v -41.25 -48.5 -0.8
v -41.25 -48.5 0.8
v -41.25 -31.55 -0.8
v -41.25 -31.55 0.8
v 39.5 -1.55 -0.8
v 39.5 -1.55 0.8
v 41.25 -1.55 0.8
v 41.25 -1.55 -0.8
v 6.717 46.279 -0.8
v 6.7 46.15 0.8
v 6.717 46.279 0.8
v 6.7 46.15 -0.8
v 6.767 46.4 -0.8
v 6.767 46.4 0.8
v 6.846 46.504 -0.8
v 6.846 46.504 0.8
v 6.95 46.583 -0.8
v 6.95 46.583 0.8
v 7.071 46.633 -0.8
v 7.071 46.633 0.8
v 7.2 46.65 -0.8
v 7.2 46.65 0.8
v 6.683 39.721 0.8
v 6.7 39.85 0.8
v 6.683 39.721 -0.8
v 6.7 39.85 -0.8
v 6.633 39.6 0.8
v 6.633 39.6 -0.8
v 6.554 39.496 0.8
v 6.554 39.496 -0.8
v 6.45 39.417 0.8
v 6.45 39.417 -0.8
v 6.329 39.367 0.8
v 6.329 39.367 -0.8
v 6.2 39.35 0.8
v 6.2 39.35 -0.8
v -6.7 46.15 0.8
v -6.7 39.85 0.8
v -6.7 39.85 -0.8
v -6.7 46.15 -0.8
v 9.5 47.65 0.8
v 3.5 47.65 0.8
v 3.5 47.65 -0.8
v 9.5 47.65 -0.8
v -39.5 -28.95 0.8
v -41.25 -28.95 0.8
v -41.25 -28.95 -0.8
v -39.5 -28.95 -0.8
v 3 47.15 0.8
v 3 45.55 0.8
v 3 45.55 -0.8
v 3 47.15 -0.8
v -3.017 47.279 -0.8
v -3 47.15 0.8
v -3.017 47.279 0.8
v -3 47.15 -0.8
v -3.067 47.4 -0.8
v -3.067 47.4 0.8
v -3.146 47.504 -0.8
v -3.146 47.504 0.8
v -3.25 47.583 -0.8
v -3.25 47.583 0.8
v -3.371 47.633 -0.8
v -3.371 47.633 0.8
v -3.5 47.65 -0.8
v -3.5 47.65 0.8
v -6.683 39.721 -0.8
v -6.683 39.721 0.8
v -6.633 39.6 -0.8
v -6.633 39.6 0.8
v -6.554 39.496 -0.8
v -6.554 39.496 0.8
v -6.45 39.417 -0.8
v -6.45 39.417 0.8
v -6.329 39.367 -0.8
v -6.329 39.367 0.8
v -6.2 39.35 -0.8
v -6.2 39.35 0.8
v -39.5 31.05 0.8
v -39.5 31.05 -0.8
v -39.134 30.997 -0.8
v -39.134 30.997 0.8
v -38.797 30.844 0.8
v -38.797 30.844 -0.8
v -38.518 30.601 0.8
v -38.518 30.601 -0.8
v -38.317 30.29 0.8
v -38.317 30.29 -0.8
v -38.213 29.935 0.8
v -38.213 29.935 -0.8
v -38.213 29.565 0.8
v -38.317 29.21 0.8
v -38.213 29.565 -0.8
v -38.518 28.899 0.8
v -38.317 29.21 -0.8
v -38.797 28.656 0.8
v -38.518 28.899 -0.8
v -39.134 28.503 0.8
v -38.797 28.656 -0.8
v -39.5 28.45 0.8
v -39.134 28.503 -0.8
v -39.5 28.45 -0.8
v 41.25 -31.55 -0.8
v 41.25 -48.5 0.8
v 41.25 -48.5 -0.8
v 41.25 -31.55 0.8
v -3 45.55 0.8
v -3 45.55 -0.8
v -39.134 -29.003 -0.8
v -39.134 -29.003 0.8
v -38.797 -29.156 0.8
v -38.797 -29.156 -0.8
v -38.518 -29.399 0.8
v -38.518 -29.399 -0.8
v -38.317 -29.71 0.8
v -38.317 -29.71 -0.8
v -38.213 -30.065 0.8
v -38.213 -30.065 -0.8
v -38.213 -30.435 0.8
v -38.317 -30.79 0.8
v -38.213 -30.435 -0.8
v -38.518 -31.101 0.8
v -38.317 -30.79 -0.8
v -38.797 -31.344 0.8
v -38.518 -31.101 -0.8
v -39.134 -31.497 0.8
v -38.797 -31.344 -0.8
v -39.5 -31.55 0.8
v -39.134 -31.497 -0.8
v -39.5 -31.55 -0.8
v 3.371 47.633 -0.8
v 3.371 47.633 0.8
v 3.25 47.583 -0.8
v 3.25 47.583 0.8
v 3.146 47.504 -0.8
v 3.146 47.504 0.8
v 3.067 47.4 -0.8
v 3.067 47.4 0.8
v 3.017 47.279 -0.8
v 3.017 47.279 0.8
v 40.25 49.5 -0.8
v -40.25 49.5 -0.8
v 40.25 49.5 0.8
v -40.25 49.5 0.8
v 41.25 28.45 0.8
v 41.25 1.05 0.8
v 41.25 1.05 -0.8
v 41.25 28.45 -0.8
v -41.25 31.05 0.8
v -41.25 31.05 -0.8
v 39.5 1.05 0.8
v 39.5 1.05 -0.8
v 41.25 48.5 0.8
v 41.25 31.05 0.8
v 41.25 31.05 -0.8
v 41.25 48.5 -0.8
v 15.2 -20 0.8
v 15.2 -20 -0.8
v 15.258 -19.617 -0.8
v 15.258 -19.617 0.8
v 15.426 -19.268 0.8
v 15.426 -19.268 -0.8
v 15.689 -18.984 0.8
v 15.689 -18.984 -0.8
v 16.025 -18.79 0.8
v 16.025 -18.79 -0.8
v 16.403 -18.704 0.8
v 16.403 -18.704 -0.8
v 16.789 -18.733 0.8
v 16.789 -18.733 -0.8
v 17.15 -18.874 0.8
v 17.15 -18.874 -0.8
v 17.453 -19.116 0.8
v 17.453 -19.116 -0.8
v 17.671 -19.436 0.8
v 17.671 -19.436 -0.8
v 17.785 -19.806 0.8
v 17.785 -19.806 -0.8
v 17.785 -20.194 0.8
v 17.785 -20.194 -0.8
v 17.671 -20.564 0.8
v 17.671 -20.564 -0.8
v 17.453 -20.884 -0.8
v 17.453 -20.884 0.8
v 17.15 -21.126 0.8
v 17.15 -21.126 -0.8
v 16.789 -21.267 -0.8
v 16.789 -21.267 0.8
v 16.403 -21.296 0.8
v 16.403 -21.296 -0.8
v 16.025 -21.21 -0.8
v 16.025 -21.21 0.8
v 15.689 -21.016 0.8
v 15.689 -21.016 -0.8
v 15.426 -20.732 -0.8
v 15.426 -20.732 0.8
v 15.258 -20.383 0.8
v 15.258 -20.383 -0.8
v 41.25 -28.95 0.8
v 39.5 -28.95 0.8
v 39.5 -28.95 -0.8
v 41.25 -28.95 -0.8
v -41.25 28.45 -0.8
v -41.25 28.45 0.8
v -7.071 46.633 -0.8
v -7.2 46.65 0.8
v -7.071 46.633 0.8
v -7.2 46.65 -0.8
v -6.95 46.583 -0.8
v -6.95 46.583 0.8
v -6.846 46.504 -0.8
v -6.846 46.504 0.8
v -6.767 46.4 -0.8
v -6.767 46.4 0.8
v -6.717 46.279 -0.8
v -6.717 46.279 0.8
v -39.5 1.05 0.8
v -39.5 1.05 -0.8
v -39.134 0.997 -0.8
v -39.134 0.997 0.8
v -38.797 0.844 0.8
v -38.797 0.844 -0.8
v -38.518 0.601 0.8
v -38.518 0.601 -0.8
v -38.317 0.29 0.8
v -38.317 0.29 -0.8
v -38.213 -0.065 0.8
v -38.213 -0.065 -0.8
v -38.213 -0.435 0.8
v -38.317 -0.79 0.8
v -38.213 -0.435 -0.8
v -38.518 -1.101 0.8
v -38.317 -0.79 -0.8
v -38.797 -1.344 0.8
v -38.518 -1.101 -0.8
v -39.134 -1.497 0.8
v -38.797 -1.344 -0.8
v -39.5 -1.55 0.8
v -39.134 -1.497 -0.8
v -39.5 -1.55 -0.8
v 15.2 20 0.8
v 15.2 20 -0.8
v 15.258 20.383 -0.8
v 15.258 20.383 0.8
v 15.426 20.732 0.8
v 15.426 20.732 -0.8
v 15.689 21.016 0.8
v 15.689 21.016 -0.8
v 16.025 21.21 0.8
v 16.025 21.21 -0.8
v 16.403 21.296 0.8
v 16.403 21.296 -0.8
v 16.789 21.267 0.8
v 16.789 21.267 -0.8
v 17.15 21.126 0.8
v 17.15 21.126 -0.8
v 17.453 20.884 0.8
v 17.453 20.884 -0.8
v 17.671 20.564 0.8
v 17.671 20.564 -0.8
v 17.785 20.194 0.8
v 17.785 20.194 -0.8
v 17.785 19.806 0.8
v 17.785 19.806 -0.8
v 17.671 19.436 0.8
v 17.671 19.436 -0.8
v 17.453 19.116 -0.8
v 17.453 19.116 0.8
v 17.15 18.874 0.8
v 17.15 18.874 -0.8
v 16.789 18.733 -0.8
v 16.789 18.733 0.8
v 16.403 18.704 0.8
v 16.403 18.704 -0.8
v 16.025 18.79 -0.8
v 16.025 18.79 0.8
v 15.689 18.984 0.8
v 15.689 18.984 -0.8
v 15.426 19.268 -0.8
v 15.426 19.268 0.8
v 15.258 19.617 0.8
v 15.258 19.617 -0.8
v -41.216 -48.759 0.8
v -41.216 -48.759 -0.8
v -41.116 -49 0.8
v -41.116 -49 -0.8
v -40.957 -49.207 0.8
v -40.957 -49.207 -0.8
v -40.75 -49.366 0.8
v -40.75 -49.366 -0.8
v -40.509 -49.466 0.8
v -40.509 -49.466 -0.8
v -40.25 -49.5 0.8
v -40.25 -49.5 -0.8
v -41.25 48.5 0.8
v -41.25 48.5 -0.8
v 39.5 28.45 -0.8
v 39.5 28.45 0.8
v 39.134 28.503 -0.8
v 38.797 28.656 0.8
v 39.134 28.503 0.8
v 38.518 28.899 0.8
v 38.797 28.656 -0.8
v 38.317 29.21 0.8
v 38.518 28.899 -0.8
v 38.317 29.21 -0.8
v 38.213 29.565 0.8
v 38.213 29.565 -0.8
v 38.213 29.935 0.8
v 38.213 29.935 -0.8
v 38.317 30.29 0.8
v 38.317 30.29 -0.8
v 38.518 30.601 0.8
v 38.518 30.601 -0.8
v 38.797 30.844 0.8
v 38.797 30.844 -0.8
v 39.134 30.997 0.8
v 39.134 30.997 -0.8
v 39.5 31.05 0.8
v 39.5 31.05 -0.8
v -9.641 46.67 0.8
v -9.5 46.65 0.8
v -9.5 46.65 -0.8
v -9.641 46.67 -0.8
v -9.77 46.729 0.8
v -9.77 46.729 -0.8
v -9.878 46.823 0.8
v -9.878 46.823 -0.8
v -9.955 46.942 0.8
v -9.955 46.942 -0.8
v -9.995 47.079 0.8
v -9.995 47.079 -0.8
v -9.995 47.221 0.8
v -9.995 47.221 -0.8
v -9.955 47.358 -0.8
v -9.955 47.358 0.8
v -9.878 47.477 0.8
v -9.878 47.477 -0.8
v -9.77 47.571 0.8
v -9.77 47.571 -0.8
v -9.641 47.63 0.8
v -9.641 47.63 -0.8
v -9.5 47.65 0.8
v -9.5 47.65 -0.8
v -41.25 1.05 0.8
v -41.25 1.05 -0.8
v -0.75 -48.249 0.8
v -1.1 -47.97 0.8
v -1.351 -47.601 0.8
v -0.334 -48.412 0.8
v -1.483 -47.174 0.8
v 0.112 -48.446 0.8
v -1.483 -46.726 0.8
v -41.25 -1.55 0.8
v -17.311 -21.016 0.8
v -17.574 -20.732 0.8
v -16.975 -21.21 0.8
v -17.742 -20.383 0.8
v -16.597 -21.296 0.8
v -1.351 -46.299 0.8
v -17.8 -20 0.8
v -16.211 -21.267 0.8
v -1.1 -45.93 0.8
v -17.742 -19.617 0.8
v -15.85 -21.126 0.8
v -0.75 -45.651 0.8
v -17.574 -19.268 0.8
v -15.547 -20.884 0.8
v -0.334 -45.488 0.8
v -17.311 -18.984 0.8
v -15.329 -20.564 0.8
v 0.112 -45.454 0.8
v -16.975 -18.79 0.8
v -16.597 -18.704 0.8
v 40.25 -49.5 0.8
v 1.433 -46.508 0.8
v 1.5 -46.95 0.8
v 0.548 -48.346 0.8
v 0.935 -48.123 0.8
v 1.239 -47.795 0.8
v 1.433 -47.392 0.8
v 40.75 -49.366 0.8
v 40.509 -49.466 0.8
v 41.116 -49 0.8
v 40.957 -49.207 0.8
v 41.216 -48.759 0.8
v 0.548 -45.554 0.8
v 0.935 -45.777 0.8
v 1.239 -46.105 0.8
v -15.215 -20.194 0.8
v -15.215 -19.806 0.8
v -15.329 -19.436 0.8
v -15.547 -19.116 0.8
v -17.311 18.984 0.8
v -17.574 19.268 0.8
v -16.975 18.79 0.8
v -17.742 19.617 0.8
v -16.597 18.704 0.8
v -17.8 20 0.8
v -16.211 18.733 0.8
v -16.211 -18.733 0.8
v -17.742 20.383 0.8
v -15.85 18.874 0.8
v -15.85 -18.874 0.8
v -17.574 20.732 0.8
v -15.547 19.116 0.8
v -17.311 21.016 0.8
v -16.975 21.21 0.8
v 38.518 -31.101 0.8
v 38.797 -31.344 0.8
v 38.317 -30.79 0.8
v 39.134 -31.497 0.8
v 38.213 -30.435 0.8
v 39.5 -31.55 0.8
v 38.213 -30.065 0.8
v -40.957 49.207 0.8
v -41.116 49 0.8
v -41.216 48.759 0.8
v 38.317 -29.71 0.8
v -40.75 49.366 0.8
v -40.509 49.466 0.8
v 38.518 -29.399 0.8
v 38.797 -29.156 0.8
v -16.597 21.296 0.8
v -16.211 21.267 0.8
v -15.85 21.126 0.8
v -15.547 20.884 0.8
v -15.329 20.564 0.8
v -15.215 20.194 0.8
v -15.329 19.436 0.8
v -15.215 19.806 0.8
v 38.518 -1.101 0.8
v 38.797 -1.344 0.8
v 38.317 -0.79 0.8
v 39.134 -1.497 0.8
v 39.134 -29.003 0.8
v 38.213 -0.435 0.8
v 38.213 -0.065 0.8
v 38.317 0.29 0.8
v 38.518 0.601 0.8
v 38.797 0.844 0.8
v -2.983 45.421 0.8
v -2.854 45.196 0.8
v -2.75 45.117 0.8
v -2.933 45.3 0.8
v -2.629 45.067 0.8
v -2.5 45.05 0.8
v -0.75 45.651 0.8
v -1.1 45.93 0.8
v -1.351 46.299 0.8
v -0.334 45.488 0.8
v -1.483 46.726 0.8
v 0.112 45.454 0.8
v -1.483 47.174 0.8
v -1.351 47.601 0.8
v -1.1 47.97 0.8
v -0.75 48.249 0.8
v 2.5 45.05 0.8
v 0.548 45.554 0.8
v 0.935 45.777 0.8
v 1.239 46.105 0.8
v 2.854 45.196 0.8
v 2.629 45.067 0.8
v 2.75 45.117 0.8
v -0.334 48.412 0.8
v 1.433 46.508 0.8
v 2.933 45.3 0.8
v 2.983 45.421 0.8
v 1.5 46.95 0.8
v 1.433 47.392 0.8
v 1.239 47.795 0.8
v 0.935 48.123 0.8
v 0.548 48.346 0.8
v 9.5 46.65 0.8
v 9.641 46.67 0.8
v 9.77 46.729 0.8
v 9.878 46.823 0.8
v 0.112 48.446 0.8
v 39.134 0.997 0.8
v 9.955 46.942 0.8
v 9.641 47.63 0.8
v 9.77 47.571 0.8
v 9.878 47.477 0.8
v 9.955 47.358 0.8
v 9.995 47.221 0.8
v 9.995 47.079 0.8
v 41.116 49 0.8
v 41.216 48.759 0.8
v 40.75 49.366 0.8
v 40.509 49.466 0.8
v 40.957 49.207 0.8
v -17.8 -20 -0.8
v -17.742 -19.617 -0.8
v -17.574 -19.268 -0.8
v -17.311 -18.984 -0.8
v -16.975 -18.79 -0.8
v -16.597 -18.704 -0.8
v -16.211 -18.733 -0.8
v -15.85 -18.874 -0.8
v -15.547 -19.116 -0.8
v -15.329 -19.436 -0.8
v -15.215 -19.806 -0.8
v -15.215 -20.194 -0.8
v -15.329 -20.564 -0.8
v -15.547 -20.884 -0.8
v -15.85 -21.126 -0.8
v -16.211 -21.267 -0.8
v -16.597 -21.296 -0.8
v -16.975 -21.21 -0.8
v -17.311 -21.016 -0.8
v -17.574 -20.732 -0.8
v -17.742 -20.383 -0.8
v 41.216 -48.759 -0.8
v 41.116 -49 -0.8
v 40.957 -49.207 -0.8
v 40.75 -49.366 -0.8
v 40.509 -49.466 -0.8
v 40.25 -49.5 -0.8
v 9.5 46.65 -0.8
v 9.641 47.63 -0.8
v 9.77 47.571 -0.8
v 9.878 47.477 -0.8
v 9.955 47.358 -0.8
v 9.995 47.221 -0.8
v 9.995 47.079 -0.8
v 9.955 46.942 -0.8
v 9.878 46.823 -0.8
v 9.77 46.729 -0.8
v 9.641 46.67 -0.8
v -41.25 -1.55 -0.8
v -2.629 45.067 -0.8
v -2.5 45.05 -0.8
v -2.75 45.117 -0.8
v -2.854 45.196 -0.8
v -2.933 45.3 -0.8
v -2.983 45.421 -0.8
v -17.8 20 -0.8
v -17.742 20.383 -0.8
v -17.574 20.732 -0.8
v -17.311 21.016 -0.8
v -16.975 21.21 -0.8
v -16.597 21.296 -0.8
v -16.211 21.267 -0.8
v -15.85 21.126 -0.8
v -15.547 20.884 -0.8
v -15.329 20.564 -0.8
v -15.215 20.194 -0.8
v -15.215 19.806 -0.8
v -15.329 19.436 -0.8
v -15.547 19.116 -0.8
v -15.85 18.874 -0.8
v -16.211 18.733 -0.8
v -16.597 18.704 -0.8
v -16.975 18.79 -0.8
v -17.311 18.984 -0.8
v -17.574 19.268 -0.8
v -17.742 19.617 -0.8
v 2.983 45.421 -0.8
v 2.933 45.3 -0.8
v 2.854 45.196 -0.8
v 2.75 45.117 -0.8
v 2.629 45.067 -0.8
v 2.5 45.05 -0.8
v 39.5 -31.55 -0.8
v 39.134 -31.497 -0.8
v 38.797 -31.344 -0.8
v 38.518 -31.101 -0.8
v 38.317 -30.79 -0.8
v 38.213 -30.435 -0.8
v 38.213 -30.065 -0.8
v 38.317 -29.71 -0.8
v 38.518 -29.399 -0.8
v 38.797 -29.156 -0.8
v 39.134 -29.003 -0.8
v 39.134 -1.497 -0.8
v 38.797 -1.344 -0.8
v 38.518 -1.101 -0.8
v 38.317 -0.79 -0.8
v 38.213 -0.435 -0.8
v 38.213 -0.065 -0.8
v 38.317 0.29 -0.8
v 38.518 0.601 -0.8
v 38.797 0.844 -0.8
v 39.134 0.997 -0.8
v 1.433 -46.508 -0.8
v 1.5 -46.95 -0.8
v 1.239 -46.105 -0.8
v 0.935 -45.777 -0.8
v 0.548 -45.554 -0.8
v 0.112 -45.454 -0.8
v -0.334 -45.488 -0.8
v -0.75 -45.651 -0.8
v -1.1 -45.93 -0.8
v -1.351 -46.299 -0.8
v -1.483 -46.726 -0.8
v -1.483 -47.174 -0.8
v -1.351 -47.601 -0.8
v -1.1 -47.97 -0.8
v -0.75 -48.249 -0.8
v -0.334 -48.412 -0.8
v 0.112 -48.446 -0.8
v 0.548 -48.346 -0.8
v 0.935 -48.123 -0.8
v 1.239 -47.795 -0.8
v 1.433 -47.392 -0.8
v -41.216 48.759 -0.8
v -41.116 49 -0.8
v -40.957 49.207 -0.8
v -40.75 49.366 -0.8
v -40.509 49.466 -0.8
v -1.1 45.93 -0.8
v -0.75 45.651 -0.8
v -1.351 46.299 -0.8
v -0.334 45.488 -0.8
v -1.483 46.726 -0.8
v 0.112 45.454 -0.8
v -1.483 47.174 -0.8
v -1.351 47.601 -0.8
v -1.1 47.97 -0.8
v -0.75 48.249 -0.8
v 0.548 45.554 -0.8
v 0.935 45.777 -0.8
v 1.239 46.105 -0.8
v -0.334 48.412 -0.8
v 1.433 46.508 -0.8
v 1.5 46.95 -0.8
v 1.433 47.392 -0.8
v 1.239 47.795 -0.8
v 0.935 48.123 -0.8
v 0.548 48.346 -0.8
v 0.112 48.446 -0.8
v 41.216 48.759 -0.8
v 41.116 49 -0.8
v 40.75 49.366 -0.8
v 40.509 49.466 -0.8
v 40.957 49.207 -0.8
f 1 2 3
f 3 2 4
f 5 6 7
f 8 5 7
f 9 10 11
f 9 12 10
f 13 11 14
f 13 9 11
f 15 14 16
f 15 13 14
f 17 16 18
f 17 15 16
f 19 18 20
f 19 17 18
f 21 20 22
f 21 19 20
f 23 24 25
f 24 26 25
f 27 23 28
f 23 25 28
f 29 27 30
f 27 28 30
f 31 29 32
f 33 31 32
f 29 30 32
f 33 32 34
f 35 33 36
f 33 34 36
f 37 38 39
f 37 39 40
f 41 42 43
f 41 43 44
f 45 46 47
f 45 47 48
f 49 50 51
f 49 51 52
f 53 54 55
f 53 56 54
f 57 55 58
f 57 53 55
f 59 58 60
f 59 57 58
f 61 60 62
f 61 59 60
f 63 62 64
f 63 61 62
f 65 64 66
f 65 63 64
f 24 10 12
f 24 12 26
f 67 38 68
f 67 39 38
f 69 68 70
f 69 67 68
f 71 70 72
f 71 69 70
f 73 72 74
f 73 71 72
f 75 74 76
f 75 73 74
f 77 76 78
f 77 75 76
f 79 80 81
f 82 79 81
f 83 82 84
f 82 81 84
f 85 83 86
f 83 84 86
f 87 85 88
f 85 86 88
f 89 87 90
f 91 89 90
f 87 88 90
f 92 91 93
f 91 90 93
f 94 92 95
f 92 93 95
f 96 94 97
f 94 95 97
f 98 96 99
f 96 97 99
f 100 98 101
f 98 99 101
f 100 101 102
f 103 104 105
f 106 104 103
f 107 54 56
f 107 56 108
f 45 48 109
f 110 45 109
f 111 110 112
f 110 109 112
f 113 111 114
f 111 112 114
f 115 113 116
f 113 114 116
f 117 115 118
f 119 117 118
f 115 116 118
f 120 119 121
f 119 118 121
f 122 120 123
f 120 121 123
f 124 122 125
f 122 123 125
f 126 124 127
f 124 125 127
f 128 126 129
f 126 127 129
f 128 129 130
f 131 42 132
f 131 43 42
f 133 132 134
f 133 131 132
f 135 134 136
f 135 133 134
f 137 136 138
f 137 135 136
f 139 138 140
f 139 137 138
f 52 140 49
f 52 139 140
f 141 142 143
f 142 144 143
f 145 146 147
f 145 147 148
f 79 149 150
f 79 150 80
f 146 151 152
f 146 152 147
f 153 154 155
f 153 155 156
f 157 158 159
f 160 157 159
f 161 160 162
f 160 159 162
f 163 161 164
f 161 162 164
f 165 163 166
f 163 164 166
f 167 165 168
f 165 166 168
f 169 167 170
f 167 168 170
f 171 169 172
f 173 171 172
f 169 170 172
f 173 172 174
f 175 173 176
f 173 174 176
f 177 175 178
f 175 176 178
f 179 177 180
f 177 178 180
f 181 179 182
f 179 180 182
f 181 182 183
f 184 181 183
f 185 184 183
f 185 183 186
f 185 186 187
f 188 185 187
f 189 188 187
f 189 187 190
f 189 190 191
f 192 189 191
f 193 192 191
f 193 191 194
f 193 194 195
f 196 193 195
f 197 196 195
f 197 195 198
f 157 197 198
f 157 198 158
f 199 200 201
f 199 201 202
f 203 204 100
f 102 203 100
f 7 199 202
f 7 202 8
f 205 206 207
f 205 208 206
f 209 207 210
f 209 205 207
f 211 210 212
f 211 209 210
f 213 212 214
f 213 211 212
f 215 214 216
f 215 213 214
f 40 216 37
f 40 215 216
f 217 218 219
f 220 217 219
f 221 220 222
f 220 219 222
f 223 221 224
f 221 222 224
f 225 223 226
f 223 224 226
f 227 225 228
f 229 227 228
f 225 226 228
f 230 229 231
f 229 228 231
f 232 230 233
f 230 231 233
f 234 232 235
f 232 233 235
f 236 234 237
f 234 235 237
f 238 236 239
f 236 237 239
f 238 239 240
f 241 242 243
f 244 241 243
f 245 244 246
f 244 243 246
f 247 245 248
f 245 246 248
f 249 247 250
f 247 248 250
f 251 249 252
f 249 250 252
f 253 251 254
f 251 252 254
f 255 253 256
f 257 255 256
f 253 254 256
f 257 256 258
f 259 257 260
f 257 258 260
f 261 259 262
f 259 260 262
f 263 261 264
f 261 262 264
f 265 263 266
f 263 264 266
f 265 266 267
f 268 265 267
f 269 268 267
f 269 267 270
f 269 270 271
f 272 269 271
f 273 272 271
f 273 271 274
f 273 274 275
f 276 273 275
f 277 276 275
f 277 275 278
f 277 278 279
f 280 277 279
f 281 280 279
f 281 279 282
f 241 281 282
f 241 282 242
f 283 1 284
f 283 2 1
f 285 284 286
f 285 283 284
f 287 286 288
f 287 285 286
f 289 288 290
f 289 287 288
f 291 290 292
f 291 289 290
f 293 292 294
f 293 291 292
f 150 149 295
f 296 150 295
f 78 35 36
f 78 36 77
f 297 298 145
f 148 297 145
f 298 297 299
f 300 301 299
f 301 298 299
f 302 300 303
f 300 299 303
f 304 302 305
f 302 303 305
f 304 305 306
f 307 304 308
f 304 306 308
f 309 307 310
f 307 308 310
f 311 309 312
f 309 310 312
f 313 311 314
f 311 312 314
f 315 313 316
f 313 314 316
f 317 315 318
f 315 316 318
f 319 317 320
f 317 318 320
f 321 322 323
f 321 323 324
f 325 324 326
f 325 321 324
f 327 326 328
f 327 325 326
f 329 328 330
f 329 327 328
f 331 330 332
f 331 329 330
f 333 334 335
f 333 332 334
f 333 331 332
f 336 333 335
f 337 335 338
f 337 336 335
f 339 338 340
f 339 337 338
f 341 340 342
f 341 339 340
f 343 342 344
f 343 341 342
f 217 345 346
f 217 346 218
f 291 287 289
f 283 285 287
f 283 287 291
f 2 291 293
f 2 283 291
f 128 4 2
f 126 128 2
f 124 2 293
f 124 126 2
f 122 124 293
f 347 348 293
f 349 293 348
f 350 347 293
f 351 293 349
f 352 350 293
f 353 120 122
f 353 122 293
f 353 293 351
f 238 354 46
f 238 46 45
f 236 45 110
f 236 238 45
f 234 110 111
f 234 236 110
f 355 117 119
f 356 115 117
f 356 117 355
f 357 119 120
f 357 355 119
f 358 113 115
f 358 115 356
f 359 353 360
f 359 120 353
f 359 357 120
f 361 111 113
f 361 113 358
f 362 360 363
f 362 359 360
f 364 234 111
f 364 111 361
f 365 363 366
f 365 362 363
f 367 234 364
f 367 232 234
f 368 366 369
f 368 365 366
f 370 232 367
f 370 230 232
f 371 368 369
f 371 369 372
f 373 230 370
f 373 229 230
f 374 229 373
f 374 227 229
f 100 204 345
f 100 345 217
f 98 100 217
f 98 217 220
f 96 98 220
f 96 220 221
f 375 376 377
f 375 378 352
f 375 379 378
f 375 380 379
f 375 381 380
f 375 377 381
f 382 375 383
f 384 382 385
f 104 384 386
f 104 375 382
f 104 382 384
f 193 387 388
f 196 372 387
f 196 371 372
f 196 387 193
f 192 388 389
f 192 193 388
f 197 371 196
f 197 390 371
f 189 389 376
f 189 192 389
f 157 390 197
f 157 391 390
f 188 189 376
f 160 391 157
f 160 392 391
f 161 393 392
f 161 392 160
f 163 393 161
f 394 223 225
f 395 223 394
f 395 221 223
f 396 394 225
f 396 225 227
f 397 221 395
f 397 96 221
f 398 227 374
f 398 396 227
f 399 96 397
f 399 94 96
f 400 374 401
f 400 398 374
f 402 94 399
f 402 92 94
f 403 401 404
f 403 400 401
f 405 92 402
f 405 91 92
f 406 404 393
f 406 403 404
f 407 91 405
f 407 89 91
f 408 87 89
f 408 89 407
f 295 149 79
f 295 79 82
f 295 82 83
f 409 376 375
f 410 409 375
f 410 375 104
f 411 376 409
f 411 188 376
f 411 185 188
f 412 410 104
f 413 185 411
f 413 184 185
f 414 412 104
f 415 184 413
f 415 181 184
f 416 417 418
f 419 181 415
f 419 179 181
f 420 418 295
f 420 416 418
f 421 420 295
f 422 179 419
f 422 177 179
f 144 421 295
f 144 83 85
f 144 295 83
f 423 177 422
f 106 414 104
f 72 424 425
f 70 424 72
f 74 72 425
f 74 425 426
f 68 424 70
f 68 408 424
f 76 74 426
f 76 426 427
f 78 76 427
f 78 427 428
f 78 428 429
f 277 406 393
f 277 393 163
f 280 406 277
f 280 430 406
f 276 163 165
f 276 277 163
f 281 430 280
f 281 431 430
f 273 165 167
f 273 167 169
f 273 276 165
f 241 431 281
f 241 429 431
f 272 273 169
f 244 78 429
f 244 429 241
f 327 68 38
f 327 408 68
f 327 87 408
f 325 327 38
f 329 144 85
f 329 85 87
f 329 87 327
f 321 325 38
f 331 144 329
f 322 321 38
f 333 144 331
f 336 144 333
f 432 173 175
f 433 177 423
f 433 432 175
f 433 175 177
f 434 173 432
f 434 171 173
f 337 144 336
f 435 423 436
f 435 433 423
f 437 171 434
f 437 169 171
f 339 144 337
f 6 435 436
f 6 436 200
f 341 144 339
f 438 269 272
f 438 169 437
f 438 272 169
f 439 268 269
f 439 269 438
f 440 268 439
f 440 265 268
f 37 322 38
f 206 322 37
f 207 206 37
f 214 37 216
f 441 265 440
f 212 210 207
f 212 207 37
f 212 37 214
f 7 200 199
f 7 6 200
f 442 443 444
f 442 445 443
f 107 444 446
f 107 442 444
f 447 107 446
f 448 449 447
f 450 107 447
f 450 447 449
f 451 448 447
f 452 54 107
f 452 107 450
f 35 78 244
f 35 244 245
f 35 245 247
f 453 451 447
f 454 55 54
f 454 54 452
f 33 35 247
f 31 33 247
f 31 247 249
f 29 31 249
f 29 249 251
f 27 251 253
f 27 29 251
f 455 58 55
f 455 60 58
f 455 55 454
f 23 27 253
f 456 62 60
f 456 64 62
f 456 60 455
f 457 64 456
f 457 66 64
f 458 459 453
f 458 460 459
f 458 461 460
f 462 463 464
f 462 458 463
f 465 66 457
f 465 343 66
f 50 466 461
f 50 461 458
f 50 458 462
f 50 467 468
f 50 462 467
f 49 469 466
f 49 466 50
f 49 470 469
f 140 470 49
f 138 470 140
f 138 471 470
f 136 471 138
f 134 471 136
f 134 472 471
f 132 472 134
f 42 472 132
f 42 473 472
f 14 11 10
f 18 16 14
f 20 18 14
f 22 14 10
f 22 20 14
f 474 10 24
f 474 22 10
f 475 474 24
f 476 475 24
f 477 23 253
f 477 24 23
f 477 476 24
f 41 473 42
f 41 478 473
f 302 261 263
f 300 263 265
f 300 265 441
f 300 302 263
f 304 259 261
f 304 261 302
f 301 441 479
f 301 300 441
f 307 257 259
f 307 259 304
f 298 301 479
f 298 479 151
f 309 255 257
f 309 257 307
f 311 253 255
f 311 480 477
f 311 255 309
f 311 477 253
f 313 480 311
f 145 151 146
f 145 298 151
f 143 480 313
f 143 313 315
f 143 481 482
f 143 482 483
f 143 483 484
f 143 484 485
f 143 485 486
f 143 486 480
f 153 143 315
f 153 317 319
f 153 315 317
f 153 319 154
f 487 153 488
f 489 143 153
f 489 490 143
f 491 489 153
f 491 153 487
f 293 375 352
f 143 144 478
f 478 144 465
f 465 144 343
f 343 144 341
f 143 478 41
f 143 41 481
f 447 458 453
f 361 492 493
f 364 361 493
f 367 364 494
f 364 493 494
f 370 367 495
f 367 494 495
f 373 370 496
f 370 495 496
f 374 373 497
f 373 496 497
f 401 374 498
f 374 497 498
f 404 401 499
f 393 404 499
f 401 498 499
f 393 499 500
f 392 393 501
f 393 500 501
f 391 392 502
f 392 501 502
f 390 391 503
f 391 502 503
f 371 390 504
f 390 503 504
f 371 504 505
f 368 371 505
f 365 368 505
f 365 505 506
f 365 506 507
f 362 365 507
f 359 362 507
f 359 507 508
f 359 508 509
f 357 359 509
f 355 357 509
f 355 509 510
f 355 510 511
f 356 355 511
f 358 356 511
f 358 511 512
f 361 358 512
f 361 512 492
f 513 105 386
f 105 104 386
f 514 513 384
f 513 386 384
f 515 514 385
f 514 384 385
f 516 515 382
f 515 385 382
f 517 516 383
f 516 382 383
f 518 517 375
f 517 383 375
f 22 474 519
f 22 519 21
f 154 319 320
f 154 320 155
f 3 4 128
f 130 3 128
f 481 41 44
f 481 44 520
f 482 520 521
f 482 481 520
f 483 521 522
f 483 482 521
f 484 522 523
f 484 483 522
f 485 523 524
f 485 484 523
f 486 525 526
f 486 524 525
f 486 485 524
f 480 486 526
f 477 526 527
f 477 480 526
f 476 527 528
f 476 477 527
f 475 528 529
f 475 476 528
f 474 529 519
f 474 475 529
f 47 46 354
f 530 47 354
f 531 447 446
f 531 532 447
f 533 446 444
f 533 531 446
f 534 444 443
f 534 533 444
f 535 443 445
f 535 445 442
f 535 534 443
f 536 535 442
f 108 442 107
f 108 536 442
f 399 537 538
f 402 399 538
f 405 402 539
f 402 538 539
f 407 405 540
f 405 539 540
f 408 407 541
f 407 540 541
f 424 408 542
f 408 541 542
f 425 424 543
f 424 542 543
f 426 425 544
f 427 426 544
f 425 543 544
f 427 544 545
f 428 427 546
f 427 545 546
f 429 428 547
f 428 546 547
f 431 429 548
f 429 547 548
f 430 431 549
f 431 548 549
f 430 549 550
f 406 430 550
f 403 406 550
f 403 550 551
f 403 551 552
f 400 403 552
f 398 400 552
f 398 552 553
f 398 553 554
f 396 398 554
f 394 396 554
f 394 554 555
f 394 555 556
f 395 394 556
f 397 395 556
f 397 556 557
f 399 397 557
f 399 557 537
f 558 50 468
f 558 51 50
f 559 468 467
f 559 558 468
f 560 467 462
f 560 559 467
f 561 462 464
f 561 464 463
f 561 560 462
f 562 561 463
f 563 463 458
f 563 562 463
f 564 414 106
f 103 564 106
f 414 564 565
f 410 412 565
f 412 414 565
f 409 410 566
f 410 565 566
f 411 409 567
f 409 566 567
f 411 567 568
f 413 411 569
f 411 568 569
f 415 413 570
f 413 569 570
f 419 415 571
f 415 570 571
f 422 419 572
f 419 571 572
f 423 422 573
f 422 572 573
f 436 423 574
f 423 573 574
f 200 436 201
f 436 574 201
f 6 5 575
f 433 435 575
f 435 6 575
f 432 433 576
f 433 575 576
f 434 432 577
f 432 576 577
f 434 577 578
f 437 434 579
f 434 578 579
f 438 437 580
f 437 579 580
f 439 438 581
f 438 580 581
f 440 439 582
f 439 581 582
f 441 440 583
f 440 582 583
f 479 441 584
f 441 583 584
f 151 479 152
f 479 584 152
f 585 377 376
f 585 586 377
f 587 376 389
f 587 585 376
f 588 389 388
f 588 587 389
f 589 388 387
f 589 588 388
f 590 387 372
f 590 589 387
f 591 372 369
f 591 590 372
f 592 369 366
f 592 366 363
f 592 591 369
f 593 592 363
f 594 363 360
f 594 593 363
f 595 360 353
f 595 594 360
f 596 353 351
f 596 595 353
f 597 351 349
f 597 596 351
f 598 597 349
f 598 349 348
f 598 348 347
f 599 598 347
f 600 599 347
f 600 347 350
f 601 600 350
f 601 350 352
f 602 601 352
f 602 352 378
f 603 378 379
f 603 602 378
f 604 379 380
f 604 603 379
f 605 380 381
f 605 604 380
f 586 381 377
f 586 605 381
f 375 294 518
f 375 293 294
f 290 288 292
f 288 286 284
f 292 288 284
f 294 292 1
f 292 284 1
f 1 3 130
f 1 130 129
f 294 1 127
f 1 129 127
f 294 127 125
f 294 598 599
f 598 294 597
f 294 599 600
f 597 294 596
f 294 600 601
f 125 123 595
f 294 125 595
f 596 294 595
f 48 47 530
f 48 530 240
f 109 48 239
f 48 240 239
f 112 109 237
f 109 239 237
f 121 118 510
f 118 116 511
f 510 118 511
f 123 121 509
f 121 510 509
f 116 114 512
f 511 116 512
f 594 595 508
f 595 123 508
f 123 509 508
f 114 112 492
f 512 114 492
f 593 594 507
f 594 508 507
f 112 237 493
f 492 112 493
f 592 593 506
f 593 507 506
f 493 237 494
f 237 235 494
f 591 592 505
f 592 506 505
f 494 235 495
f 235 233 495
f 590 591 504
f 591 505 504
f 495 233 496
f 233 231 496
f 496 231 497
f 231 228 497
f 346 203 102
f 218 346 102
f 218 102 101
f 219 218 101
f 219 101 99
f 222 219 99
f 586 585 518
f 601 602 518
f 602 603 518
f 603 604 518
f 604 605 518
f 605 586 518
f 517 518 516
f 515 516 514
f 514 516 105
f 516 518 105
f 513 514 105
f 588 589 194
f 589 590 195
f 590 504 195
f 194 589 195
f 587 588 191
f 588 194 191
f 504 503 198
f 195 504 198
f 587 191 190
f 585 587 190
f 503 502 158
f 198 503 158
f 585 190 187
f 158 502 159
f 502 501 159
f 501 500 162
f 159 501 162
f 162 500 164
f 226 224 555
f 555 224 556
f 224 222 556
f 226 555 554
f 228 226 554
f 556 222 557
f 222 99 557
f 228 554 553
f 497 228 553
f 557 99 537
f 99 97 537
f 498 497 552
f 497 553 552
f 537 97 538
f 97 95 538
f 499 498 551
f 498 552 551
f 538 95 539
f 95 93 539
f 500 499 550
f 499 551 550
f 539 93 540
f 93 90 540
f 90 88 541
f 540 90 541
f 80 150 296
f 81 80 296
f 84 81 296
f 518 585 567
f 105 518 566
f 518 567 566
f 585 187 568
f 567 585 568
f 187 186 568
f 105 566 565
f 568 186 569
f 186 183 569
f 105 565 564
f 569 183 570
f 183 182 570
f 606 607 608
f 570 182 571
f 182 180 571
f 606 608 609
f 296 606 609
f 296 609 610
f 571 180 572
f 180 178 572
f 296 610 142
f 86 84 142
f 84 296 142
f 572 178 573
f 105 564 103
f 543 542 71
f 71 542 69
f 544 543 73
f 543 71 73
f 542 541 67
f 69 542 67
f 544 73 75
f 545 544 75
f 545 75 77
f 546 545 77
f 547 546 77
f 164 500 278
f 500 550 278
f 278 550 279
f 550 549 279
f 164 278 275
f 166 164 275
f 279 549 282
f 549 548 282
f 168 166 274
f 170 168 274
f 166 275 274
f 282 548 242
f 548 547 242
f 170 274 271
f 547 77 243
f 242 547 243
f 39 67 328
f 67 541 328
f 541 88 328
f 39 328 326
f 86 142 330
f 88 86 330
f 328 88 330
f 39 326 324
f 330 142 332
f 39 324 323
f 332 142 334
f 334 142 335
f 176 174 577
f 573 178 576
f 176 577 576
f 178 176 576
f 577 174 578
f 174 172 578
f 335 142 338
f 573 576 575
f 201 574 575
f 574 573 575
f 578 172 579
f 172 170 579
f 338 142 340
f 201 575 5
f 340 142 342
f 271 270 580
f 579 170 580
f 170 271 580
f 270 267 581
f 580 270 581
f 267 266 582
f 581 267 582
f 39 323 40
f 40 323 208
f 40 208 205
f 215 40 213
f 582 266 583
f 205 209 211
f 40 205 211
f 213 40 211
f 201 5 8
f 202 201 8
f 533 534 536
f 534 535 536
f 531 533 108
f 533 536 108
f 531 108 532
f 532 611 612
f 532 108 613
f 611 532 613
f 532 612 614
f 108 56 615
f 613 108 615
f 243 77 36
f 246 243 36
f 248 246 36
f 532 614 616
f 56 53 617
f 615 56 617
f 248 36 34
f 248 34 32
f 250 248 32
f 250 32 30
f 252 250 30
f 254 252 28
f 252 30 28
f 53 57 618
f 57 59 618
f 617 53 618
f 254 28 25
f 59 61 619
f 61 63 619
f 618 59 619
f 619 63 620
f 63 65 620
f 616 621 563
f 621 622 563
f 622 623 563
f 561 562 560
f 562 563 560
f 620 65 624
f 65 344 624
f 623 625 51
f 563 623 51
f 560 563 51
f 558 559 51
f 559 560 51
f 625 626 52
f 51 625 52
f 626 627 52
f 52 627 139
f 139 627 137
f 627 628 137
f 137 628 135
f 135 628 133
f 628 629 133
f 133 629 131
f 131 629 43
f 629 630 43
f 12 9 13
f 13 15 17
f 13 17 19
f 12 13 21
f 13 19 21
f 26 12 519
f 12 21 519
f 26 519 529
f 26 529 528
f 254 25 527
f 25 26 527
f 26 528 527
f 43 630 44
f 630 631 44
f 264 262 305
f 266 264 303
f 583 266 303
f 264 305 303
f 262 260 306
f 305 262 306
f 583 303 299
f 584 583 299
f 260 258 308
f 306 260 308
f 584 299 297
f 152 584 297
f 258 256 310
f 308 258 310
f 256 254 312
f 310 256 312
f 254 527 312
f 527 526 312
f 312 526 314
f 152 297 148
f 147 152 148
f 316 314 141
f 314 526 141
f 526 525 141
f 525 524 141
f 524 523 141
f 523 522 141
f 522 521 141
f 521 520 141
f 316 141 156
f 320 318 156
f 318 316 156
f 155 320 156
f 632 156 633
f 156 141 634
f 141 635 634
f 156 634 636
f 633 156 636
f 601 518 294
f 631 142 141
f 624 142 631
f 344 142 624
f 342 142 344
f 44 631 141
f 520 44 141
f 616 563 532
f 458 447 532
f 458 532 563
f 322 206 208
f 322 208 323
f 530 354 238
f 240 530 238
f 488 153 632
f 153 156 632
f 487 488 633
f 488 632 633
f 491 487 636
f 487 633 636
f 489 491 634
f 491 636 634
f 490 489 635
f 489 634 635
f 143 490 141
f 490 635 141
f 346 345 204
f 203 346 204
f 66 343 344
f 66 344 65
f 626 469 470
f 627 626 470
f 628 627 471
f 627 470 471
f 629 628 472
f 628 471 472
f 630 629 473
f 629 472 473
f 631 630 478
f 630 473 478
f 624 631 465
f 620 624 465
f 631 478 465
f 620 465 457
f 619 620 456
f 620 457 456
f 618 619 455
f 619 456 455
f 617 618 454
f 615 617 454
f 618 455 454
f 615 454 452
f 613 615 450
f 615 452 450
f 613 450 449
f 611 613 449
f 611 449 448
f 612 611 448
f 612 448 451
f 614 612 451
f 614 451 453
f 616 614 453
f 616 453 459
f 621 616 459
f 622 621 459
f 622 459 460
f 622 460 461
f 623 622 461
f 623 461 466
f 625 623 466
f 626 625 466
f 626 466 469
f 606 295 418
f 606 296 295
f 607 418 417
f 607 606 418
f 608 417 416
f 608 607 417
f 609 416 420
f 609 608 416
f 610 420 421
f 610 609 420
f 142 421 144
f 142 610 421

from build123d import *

# Parameters (mm, degrees)
SKETCH2_W            = 82.5
SKETCH2_H            = 99
SKETCH2_R            = 0.8
SKETCH2_R_2          = 1.5
PCB_EXTRUDE_DEPTH    = 0.8
CORNER_FILLETS_R     = 1
SKETCH4_R            = 1.5
SOLAR_HOLES_DEPTH    = 65.454421881
SOLAR_HOLE_FILLETS_R = 0.5
M2_CLEARANCE_HOLES_D = 2.6
SKETCH10_W           = 1.75
SKETCH10_H           = 2.6
CUT_EXTRUDE2_DEPTH   = 65.454421881


with BuildPart() as part:
    # Sketch2 → pcb extrude (new, symmetric)
    with BuildSketch(Plane.XY):
        Rectangle(SKETCH2_W, SKETCH2_H)
        with Locations((0, 46.95)):
            Circle(SKETCH2_R, mode=Mode.SUBTRACT)
        with Locations((-39.5, -30.25)):
            Circle(SKETCH2_R, mode=Mode.SUBTRACT)
        with Locations((-39.5, -0.25)):
            Circle(SKETCH2_R, mode=Mode.SUBTRACT)
        with Locations((-39.5, 29.75)):
            Circle(SKETCH2_R, mode=Mode.SUBTRACT)
        with Locations((39.5, -30.25)):
            Circle(SKETCH2_R, mode=Mode.SUBTRACT)
        with Locations((39.5, -0.25)):
            Circle(SKETCH2_R, mode=Mode.SUBTRACT)
        with Locations((39.5, 29.75)):
            Circle(SKETCH2_R, mode=Mode.SUBTRACT)
        with Locations((0, -46.95)):
            Circle(SKETCH2_R_2, mode=Mode.SUBTRACT)
        with Locations((-16.5, 20)):
            Circle(SKETCH2_R, mode=Mode.SUBTRACT)
        with Locations((16.5, 20)):
            Circle(SKETCH2_R, mode=Mode.SUBTRACT)
        with Locations((-16.5, -20)):
            Circle(SKETCH2_R, mode=Mode.SUBTRACT)
        with Locations((16.5, -20)):
            Circle(SKETCH2_R, mode=Mode.SUBTRACT)
    extrude(amount=PCB_EXTRUDE_DEPTH, both=True)

    # corner fillets
    corner_fillets_edges = [part.edges().sort_by_distance(p)[0] for p in [
        (41.25, 49.5, 0),
        (41.25, -49.5, 0),
        (-41.25, -49.5, 0),
        (-41.25, 49.5, 0),
    ]]
    fillet(corner_fillets_edges, radius=CORNER_FILLETS_R)

    # Sketch4 → solar holes (cut, through all)
    with BuildSketch(Plane.XY.offset(0.8)):
        with Locations((0, 46.95)):
            Circle(SKETCH4_R)
        with BuildLine():
            Line((6.7, 39.35), (-6.7, 39.35))
            Line((-6.7, 39.35), (-6.7, 46.65))
            Line((-6.7, 46.65), (-9.5, 46.65))
            ThreePointArc((-9.5, 46.65), (-10, 47.15), (-9.5, 47.65))
            Line((-9.5, 47.65), (-3, 47.65))
            Line((-3, 47.65), (-3, 45.05))
            Line((-3, 45.05), (3, 45.05))
            Line((3, 45.05), (3, 47.65))
            Line((3, 47.65), (9.5, 47.65))
            ThreePointArc((9.5, 47.65), (10, 47.15), (9.5, 46.65))
            Line((9.5, 46.65), (6.7, 46.65))
            Line((6.7, 46.65), (6.7, 39.35))
        make_face()
    extrude(amount=-SOLAR_HOLES_DEPTH, mode=Mode.SUBTRACT)

    # solar hole fillets
    solar_hole_fillets_edges = [part.edges().sort_by_distance(p)[0] for p in [
        (-6.7, 39.35, 0),
        (-6.7, 46.65, 0),
        (-3, 47.65, 0),
        (-3, 45.05, 0),
        (3, 45.05, 0),
        (3, 47.65, 0),
        (6.7, 46.65, 0),
        (6.7, 39.35, 0),
    ]]
    fillet(solar_hole_fillets_edges, radius=SOLAR_HOLE_FILLETS_R)

    # M2 Clearance Holes (through all)
    with Locations(Plane.XY.offset(0.8)):
        with Locations((-39.5, 29.75), (-39.5, -0.25), (-16.5, 20), (16.5, 20), (16.5, -20), (-16.5, -20), (39.5, 29.75), (39.5, -0.25), (39.5, -30.25), (-39.5, -30.25)):
            Hole(M2_CLEARANCE_HOLES_D / 2)

    # Sketch10 → Cut-Extrude2 (cut, through all)
    with BuildSketch(Plane.XY.offset(0.8)):
        with Locations((-40.375, 29.75)):
            Rectangle(SKETCH10_W, SKETCH10_H)
        with Locations((-40.375, -0.25)):
            Rectangle(SKETCH10_W, SKETCH10_H)
        with Locations((-40.375, -30.25)):
            Rectangle(SKETCH10_W, SKETCH10_H)
        with Locations((40.375, -30.25)):
            Rectangle(SKETCH10_W, SKETCH10_H)
        with Locations((40.375, -0.25)):
            Rectangle(SKETCH10_W, SKETCH10_H)
        with Locations((40.375, 29.75)):
            Rectangle(SKETCH10_W, SKETCH10_H)
    extrude(amount=-CUT_EXTRUDE2_DEPTH, mode=Mode.SUBTRACT)


solid = part.part
